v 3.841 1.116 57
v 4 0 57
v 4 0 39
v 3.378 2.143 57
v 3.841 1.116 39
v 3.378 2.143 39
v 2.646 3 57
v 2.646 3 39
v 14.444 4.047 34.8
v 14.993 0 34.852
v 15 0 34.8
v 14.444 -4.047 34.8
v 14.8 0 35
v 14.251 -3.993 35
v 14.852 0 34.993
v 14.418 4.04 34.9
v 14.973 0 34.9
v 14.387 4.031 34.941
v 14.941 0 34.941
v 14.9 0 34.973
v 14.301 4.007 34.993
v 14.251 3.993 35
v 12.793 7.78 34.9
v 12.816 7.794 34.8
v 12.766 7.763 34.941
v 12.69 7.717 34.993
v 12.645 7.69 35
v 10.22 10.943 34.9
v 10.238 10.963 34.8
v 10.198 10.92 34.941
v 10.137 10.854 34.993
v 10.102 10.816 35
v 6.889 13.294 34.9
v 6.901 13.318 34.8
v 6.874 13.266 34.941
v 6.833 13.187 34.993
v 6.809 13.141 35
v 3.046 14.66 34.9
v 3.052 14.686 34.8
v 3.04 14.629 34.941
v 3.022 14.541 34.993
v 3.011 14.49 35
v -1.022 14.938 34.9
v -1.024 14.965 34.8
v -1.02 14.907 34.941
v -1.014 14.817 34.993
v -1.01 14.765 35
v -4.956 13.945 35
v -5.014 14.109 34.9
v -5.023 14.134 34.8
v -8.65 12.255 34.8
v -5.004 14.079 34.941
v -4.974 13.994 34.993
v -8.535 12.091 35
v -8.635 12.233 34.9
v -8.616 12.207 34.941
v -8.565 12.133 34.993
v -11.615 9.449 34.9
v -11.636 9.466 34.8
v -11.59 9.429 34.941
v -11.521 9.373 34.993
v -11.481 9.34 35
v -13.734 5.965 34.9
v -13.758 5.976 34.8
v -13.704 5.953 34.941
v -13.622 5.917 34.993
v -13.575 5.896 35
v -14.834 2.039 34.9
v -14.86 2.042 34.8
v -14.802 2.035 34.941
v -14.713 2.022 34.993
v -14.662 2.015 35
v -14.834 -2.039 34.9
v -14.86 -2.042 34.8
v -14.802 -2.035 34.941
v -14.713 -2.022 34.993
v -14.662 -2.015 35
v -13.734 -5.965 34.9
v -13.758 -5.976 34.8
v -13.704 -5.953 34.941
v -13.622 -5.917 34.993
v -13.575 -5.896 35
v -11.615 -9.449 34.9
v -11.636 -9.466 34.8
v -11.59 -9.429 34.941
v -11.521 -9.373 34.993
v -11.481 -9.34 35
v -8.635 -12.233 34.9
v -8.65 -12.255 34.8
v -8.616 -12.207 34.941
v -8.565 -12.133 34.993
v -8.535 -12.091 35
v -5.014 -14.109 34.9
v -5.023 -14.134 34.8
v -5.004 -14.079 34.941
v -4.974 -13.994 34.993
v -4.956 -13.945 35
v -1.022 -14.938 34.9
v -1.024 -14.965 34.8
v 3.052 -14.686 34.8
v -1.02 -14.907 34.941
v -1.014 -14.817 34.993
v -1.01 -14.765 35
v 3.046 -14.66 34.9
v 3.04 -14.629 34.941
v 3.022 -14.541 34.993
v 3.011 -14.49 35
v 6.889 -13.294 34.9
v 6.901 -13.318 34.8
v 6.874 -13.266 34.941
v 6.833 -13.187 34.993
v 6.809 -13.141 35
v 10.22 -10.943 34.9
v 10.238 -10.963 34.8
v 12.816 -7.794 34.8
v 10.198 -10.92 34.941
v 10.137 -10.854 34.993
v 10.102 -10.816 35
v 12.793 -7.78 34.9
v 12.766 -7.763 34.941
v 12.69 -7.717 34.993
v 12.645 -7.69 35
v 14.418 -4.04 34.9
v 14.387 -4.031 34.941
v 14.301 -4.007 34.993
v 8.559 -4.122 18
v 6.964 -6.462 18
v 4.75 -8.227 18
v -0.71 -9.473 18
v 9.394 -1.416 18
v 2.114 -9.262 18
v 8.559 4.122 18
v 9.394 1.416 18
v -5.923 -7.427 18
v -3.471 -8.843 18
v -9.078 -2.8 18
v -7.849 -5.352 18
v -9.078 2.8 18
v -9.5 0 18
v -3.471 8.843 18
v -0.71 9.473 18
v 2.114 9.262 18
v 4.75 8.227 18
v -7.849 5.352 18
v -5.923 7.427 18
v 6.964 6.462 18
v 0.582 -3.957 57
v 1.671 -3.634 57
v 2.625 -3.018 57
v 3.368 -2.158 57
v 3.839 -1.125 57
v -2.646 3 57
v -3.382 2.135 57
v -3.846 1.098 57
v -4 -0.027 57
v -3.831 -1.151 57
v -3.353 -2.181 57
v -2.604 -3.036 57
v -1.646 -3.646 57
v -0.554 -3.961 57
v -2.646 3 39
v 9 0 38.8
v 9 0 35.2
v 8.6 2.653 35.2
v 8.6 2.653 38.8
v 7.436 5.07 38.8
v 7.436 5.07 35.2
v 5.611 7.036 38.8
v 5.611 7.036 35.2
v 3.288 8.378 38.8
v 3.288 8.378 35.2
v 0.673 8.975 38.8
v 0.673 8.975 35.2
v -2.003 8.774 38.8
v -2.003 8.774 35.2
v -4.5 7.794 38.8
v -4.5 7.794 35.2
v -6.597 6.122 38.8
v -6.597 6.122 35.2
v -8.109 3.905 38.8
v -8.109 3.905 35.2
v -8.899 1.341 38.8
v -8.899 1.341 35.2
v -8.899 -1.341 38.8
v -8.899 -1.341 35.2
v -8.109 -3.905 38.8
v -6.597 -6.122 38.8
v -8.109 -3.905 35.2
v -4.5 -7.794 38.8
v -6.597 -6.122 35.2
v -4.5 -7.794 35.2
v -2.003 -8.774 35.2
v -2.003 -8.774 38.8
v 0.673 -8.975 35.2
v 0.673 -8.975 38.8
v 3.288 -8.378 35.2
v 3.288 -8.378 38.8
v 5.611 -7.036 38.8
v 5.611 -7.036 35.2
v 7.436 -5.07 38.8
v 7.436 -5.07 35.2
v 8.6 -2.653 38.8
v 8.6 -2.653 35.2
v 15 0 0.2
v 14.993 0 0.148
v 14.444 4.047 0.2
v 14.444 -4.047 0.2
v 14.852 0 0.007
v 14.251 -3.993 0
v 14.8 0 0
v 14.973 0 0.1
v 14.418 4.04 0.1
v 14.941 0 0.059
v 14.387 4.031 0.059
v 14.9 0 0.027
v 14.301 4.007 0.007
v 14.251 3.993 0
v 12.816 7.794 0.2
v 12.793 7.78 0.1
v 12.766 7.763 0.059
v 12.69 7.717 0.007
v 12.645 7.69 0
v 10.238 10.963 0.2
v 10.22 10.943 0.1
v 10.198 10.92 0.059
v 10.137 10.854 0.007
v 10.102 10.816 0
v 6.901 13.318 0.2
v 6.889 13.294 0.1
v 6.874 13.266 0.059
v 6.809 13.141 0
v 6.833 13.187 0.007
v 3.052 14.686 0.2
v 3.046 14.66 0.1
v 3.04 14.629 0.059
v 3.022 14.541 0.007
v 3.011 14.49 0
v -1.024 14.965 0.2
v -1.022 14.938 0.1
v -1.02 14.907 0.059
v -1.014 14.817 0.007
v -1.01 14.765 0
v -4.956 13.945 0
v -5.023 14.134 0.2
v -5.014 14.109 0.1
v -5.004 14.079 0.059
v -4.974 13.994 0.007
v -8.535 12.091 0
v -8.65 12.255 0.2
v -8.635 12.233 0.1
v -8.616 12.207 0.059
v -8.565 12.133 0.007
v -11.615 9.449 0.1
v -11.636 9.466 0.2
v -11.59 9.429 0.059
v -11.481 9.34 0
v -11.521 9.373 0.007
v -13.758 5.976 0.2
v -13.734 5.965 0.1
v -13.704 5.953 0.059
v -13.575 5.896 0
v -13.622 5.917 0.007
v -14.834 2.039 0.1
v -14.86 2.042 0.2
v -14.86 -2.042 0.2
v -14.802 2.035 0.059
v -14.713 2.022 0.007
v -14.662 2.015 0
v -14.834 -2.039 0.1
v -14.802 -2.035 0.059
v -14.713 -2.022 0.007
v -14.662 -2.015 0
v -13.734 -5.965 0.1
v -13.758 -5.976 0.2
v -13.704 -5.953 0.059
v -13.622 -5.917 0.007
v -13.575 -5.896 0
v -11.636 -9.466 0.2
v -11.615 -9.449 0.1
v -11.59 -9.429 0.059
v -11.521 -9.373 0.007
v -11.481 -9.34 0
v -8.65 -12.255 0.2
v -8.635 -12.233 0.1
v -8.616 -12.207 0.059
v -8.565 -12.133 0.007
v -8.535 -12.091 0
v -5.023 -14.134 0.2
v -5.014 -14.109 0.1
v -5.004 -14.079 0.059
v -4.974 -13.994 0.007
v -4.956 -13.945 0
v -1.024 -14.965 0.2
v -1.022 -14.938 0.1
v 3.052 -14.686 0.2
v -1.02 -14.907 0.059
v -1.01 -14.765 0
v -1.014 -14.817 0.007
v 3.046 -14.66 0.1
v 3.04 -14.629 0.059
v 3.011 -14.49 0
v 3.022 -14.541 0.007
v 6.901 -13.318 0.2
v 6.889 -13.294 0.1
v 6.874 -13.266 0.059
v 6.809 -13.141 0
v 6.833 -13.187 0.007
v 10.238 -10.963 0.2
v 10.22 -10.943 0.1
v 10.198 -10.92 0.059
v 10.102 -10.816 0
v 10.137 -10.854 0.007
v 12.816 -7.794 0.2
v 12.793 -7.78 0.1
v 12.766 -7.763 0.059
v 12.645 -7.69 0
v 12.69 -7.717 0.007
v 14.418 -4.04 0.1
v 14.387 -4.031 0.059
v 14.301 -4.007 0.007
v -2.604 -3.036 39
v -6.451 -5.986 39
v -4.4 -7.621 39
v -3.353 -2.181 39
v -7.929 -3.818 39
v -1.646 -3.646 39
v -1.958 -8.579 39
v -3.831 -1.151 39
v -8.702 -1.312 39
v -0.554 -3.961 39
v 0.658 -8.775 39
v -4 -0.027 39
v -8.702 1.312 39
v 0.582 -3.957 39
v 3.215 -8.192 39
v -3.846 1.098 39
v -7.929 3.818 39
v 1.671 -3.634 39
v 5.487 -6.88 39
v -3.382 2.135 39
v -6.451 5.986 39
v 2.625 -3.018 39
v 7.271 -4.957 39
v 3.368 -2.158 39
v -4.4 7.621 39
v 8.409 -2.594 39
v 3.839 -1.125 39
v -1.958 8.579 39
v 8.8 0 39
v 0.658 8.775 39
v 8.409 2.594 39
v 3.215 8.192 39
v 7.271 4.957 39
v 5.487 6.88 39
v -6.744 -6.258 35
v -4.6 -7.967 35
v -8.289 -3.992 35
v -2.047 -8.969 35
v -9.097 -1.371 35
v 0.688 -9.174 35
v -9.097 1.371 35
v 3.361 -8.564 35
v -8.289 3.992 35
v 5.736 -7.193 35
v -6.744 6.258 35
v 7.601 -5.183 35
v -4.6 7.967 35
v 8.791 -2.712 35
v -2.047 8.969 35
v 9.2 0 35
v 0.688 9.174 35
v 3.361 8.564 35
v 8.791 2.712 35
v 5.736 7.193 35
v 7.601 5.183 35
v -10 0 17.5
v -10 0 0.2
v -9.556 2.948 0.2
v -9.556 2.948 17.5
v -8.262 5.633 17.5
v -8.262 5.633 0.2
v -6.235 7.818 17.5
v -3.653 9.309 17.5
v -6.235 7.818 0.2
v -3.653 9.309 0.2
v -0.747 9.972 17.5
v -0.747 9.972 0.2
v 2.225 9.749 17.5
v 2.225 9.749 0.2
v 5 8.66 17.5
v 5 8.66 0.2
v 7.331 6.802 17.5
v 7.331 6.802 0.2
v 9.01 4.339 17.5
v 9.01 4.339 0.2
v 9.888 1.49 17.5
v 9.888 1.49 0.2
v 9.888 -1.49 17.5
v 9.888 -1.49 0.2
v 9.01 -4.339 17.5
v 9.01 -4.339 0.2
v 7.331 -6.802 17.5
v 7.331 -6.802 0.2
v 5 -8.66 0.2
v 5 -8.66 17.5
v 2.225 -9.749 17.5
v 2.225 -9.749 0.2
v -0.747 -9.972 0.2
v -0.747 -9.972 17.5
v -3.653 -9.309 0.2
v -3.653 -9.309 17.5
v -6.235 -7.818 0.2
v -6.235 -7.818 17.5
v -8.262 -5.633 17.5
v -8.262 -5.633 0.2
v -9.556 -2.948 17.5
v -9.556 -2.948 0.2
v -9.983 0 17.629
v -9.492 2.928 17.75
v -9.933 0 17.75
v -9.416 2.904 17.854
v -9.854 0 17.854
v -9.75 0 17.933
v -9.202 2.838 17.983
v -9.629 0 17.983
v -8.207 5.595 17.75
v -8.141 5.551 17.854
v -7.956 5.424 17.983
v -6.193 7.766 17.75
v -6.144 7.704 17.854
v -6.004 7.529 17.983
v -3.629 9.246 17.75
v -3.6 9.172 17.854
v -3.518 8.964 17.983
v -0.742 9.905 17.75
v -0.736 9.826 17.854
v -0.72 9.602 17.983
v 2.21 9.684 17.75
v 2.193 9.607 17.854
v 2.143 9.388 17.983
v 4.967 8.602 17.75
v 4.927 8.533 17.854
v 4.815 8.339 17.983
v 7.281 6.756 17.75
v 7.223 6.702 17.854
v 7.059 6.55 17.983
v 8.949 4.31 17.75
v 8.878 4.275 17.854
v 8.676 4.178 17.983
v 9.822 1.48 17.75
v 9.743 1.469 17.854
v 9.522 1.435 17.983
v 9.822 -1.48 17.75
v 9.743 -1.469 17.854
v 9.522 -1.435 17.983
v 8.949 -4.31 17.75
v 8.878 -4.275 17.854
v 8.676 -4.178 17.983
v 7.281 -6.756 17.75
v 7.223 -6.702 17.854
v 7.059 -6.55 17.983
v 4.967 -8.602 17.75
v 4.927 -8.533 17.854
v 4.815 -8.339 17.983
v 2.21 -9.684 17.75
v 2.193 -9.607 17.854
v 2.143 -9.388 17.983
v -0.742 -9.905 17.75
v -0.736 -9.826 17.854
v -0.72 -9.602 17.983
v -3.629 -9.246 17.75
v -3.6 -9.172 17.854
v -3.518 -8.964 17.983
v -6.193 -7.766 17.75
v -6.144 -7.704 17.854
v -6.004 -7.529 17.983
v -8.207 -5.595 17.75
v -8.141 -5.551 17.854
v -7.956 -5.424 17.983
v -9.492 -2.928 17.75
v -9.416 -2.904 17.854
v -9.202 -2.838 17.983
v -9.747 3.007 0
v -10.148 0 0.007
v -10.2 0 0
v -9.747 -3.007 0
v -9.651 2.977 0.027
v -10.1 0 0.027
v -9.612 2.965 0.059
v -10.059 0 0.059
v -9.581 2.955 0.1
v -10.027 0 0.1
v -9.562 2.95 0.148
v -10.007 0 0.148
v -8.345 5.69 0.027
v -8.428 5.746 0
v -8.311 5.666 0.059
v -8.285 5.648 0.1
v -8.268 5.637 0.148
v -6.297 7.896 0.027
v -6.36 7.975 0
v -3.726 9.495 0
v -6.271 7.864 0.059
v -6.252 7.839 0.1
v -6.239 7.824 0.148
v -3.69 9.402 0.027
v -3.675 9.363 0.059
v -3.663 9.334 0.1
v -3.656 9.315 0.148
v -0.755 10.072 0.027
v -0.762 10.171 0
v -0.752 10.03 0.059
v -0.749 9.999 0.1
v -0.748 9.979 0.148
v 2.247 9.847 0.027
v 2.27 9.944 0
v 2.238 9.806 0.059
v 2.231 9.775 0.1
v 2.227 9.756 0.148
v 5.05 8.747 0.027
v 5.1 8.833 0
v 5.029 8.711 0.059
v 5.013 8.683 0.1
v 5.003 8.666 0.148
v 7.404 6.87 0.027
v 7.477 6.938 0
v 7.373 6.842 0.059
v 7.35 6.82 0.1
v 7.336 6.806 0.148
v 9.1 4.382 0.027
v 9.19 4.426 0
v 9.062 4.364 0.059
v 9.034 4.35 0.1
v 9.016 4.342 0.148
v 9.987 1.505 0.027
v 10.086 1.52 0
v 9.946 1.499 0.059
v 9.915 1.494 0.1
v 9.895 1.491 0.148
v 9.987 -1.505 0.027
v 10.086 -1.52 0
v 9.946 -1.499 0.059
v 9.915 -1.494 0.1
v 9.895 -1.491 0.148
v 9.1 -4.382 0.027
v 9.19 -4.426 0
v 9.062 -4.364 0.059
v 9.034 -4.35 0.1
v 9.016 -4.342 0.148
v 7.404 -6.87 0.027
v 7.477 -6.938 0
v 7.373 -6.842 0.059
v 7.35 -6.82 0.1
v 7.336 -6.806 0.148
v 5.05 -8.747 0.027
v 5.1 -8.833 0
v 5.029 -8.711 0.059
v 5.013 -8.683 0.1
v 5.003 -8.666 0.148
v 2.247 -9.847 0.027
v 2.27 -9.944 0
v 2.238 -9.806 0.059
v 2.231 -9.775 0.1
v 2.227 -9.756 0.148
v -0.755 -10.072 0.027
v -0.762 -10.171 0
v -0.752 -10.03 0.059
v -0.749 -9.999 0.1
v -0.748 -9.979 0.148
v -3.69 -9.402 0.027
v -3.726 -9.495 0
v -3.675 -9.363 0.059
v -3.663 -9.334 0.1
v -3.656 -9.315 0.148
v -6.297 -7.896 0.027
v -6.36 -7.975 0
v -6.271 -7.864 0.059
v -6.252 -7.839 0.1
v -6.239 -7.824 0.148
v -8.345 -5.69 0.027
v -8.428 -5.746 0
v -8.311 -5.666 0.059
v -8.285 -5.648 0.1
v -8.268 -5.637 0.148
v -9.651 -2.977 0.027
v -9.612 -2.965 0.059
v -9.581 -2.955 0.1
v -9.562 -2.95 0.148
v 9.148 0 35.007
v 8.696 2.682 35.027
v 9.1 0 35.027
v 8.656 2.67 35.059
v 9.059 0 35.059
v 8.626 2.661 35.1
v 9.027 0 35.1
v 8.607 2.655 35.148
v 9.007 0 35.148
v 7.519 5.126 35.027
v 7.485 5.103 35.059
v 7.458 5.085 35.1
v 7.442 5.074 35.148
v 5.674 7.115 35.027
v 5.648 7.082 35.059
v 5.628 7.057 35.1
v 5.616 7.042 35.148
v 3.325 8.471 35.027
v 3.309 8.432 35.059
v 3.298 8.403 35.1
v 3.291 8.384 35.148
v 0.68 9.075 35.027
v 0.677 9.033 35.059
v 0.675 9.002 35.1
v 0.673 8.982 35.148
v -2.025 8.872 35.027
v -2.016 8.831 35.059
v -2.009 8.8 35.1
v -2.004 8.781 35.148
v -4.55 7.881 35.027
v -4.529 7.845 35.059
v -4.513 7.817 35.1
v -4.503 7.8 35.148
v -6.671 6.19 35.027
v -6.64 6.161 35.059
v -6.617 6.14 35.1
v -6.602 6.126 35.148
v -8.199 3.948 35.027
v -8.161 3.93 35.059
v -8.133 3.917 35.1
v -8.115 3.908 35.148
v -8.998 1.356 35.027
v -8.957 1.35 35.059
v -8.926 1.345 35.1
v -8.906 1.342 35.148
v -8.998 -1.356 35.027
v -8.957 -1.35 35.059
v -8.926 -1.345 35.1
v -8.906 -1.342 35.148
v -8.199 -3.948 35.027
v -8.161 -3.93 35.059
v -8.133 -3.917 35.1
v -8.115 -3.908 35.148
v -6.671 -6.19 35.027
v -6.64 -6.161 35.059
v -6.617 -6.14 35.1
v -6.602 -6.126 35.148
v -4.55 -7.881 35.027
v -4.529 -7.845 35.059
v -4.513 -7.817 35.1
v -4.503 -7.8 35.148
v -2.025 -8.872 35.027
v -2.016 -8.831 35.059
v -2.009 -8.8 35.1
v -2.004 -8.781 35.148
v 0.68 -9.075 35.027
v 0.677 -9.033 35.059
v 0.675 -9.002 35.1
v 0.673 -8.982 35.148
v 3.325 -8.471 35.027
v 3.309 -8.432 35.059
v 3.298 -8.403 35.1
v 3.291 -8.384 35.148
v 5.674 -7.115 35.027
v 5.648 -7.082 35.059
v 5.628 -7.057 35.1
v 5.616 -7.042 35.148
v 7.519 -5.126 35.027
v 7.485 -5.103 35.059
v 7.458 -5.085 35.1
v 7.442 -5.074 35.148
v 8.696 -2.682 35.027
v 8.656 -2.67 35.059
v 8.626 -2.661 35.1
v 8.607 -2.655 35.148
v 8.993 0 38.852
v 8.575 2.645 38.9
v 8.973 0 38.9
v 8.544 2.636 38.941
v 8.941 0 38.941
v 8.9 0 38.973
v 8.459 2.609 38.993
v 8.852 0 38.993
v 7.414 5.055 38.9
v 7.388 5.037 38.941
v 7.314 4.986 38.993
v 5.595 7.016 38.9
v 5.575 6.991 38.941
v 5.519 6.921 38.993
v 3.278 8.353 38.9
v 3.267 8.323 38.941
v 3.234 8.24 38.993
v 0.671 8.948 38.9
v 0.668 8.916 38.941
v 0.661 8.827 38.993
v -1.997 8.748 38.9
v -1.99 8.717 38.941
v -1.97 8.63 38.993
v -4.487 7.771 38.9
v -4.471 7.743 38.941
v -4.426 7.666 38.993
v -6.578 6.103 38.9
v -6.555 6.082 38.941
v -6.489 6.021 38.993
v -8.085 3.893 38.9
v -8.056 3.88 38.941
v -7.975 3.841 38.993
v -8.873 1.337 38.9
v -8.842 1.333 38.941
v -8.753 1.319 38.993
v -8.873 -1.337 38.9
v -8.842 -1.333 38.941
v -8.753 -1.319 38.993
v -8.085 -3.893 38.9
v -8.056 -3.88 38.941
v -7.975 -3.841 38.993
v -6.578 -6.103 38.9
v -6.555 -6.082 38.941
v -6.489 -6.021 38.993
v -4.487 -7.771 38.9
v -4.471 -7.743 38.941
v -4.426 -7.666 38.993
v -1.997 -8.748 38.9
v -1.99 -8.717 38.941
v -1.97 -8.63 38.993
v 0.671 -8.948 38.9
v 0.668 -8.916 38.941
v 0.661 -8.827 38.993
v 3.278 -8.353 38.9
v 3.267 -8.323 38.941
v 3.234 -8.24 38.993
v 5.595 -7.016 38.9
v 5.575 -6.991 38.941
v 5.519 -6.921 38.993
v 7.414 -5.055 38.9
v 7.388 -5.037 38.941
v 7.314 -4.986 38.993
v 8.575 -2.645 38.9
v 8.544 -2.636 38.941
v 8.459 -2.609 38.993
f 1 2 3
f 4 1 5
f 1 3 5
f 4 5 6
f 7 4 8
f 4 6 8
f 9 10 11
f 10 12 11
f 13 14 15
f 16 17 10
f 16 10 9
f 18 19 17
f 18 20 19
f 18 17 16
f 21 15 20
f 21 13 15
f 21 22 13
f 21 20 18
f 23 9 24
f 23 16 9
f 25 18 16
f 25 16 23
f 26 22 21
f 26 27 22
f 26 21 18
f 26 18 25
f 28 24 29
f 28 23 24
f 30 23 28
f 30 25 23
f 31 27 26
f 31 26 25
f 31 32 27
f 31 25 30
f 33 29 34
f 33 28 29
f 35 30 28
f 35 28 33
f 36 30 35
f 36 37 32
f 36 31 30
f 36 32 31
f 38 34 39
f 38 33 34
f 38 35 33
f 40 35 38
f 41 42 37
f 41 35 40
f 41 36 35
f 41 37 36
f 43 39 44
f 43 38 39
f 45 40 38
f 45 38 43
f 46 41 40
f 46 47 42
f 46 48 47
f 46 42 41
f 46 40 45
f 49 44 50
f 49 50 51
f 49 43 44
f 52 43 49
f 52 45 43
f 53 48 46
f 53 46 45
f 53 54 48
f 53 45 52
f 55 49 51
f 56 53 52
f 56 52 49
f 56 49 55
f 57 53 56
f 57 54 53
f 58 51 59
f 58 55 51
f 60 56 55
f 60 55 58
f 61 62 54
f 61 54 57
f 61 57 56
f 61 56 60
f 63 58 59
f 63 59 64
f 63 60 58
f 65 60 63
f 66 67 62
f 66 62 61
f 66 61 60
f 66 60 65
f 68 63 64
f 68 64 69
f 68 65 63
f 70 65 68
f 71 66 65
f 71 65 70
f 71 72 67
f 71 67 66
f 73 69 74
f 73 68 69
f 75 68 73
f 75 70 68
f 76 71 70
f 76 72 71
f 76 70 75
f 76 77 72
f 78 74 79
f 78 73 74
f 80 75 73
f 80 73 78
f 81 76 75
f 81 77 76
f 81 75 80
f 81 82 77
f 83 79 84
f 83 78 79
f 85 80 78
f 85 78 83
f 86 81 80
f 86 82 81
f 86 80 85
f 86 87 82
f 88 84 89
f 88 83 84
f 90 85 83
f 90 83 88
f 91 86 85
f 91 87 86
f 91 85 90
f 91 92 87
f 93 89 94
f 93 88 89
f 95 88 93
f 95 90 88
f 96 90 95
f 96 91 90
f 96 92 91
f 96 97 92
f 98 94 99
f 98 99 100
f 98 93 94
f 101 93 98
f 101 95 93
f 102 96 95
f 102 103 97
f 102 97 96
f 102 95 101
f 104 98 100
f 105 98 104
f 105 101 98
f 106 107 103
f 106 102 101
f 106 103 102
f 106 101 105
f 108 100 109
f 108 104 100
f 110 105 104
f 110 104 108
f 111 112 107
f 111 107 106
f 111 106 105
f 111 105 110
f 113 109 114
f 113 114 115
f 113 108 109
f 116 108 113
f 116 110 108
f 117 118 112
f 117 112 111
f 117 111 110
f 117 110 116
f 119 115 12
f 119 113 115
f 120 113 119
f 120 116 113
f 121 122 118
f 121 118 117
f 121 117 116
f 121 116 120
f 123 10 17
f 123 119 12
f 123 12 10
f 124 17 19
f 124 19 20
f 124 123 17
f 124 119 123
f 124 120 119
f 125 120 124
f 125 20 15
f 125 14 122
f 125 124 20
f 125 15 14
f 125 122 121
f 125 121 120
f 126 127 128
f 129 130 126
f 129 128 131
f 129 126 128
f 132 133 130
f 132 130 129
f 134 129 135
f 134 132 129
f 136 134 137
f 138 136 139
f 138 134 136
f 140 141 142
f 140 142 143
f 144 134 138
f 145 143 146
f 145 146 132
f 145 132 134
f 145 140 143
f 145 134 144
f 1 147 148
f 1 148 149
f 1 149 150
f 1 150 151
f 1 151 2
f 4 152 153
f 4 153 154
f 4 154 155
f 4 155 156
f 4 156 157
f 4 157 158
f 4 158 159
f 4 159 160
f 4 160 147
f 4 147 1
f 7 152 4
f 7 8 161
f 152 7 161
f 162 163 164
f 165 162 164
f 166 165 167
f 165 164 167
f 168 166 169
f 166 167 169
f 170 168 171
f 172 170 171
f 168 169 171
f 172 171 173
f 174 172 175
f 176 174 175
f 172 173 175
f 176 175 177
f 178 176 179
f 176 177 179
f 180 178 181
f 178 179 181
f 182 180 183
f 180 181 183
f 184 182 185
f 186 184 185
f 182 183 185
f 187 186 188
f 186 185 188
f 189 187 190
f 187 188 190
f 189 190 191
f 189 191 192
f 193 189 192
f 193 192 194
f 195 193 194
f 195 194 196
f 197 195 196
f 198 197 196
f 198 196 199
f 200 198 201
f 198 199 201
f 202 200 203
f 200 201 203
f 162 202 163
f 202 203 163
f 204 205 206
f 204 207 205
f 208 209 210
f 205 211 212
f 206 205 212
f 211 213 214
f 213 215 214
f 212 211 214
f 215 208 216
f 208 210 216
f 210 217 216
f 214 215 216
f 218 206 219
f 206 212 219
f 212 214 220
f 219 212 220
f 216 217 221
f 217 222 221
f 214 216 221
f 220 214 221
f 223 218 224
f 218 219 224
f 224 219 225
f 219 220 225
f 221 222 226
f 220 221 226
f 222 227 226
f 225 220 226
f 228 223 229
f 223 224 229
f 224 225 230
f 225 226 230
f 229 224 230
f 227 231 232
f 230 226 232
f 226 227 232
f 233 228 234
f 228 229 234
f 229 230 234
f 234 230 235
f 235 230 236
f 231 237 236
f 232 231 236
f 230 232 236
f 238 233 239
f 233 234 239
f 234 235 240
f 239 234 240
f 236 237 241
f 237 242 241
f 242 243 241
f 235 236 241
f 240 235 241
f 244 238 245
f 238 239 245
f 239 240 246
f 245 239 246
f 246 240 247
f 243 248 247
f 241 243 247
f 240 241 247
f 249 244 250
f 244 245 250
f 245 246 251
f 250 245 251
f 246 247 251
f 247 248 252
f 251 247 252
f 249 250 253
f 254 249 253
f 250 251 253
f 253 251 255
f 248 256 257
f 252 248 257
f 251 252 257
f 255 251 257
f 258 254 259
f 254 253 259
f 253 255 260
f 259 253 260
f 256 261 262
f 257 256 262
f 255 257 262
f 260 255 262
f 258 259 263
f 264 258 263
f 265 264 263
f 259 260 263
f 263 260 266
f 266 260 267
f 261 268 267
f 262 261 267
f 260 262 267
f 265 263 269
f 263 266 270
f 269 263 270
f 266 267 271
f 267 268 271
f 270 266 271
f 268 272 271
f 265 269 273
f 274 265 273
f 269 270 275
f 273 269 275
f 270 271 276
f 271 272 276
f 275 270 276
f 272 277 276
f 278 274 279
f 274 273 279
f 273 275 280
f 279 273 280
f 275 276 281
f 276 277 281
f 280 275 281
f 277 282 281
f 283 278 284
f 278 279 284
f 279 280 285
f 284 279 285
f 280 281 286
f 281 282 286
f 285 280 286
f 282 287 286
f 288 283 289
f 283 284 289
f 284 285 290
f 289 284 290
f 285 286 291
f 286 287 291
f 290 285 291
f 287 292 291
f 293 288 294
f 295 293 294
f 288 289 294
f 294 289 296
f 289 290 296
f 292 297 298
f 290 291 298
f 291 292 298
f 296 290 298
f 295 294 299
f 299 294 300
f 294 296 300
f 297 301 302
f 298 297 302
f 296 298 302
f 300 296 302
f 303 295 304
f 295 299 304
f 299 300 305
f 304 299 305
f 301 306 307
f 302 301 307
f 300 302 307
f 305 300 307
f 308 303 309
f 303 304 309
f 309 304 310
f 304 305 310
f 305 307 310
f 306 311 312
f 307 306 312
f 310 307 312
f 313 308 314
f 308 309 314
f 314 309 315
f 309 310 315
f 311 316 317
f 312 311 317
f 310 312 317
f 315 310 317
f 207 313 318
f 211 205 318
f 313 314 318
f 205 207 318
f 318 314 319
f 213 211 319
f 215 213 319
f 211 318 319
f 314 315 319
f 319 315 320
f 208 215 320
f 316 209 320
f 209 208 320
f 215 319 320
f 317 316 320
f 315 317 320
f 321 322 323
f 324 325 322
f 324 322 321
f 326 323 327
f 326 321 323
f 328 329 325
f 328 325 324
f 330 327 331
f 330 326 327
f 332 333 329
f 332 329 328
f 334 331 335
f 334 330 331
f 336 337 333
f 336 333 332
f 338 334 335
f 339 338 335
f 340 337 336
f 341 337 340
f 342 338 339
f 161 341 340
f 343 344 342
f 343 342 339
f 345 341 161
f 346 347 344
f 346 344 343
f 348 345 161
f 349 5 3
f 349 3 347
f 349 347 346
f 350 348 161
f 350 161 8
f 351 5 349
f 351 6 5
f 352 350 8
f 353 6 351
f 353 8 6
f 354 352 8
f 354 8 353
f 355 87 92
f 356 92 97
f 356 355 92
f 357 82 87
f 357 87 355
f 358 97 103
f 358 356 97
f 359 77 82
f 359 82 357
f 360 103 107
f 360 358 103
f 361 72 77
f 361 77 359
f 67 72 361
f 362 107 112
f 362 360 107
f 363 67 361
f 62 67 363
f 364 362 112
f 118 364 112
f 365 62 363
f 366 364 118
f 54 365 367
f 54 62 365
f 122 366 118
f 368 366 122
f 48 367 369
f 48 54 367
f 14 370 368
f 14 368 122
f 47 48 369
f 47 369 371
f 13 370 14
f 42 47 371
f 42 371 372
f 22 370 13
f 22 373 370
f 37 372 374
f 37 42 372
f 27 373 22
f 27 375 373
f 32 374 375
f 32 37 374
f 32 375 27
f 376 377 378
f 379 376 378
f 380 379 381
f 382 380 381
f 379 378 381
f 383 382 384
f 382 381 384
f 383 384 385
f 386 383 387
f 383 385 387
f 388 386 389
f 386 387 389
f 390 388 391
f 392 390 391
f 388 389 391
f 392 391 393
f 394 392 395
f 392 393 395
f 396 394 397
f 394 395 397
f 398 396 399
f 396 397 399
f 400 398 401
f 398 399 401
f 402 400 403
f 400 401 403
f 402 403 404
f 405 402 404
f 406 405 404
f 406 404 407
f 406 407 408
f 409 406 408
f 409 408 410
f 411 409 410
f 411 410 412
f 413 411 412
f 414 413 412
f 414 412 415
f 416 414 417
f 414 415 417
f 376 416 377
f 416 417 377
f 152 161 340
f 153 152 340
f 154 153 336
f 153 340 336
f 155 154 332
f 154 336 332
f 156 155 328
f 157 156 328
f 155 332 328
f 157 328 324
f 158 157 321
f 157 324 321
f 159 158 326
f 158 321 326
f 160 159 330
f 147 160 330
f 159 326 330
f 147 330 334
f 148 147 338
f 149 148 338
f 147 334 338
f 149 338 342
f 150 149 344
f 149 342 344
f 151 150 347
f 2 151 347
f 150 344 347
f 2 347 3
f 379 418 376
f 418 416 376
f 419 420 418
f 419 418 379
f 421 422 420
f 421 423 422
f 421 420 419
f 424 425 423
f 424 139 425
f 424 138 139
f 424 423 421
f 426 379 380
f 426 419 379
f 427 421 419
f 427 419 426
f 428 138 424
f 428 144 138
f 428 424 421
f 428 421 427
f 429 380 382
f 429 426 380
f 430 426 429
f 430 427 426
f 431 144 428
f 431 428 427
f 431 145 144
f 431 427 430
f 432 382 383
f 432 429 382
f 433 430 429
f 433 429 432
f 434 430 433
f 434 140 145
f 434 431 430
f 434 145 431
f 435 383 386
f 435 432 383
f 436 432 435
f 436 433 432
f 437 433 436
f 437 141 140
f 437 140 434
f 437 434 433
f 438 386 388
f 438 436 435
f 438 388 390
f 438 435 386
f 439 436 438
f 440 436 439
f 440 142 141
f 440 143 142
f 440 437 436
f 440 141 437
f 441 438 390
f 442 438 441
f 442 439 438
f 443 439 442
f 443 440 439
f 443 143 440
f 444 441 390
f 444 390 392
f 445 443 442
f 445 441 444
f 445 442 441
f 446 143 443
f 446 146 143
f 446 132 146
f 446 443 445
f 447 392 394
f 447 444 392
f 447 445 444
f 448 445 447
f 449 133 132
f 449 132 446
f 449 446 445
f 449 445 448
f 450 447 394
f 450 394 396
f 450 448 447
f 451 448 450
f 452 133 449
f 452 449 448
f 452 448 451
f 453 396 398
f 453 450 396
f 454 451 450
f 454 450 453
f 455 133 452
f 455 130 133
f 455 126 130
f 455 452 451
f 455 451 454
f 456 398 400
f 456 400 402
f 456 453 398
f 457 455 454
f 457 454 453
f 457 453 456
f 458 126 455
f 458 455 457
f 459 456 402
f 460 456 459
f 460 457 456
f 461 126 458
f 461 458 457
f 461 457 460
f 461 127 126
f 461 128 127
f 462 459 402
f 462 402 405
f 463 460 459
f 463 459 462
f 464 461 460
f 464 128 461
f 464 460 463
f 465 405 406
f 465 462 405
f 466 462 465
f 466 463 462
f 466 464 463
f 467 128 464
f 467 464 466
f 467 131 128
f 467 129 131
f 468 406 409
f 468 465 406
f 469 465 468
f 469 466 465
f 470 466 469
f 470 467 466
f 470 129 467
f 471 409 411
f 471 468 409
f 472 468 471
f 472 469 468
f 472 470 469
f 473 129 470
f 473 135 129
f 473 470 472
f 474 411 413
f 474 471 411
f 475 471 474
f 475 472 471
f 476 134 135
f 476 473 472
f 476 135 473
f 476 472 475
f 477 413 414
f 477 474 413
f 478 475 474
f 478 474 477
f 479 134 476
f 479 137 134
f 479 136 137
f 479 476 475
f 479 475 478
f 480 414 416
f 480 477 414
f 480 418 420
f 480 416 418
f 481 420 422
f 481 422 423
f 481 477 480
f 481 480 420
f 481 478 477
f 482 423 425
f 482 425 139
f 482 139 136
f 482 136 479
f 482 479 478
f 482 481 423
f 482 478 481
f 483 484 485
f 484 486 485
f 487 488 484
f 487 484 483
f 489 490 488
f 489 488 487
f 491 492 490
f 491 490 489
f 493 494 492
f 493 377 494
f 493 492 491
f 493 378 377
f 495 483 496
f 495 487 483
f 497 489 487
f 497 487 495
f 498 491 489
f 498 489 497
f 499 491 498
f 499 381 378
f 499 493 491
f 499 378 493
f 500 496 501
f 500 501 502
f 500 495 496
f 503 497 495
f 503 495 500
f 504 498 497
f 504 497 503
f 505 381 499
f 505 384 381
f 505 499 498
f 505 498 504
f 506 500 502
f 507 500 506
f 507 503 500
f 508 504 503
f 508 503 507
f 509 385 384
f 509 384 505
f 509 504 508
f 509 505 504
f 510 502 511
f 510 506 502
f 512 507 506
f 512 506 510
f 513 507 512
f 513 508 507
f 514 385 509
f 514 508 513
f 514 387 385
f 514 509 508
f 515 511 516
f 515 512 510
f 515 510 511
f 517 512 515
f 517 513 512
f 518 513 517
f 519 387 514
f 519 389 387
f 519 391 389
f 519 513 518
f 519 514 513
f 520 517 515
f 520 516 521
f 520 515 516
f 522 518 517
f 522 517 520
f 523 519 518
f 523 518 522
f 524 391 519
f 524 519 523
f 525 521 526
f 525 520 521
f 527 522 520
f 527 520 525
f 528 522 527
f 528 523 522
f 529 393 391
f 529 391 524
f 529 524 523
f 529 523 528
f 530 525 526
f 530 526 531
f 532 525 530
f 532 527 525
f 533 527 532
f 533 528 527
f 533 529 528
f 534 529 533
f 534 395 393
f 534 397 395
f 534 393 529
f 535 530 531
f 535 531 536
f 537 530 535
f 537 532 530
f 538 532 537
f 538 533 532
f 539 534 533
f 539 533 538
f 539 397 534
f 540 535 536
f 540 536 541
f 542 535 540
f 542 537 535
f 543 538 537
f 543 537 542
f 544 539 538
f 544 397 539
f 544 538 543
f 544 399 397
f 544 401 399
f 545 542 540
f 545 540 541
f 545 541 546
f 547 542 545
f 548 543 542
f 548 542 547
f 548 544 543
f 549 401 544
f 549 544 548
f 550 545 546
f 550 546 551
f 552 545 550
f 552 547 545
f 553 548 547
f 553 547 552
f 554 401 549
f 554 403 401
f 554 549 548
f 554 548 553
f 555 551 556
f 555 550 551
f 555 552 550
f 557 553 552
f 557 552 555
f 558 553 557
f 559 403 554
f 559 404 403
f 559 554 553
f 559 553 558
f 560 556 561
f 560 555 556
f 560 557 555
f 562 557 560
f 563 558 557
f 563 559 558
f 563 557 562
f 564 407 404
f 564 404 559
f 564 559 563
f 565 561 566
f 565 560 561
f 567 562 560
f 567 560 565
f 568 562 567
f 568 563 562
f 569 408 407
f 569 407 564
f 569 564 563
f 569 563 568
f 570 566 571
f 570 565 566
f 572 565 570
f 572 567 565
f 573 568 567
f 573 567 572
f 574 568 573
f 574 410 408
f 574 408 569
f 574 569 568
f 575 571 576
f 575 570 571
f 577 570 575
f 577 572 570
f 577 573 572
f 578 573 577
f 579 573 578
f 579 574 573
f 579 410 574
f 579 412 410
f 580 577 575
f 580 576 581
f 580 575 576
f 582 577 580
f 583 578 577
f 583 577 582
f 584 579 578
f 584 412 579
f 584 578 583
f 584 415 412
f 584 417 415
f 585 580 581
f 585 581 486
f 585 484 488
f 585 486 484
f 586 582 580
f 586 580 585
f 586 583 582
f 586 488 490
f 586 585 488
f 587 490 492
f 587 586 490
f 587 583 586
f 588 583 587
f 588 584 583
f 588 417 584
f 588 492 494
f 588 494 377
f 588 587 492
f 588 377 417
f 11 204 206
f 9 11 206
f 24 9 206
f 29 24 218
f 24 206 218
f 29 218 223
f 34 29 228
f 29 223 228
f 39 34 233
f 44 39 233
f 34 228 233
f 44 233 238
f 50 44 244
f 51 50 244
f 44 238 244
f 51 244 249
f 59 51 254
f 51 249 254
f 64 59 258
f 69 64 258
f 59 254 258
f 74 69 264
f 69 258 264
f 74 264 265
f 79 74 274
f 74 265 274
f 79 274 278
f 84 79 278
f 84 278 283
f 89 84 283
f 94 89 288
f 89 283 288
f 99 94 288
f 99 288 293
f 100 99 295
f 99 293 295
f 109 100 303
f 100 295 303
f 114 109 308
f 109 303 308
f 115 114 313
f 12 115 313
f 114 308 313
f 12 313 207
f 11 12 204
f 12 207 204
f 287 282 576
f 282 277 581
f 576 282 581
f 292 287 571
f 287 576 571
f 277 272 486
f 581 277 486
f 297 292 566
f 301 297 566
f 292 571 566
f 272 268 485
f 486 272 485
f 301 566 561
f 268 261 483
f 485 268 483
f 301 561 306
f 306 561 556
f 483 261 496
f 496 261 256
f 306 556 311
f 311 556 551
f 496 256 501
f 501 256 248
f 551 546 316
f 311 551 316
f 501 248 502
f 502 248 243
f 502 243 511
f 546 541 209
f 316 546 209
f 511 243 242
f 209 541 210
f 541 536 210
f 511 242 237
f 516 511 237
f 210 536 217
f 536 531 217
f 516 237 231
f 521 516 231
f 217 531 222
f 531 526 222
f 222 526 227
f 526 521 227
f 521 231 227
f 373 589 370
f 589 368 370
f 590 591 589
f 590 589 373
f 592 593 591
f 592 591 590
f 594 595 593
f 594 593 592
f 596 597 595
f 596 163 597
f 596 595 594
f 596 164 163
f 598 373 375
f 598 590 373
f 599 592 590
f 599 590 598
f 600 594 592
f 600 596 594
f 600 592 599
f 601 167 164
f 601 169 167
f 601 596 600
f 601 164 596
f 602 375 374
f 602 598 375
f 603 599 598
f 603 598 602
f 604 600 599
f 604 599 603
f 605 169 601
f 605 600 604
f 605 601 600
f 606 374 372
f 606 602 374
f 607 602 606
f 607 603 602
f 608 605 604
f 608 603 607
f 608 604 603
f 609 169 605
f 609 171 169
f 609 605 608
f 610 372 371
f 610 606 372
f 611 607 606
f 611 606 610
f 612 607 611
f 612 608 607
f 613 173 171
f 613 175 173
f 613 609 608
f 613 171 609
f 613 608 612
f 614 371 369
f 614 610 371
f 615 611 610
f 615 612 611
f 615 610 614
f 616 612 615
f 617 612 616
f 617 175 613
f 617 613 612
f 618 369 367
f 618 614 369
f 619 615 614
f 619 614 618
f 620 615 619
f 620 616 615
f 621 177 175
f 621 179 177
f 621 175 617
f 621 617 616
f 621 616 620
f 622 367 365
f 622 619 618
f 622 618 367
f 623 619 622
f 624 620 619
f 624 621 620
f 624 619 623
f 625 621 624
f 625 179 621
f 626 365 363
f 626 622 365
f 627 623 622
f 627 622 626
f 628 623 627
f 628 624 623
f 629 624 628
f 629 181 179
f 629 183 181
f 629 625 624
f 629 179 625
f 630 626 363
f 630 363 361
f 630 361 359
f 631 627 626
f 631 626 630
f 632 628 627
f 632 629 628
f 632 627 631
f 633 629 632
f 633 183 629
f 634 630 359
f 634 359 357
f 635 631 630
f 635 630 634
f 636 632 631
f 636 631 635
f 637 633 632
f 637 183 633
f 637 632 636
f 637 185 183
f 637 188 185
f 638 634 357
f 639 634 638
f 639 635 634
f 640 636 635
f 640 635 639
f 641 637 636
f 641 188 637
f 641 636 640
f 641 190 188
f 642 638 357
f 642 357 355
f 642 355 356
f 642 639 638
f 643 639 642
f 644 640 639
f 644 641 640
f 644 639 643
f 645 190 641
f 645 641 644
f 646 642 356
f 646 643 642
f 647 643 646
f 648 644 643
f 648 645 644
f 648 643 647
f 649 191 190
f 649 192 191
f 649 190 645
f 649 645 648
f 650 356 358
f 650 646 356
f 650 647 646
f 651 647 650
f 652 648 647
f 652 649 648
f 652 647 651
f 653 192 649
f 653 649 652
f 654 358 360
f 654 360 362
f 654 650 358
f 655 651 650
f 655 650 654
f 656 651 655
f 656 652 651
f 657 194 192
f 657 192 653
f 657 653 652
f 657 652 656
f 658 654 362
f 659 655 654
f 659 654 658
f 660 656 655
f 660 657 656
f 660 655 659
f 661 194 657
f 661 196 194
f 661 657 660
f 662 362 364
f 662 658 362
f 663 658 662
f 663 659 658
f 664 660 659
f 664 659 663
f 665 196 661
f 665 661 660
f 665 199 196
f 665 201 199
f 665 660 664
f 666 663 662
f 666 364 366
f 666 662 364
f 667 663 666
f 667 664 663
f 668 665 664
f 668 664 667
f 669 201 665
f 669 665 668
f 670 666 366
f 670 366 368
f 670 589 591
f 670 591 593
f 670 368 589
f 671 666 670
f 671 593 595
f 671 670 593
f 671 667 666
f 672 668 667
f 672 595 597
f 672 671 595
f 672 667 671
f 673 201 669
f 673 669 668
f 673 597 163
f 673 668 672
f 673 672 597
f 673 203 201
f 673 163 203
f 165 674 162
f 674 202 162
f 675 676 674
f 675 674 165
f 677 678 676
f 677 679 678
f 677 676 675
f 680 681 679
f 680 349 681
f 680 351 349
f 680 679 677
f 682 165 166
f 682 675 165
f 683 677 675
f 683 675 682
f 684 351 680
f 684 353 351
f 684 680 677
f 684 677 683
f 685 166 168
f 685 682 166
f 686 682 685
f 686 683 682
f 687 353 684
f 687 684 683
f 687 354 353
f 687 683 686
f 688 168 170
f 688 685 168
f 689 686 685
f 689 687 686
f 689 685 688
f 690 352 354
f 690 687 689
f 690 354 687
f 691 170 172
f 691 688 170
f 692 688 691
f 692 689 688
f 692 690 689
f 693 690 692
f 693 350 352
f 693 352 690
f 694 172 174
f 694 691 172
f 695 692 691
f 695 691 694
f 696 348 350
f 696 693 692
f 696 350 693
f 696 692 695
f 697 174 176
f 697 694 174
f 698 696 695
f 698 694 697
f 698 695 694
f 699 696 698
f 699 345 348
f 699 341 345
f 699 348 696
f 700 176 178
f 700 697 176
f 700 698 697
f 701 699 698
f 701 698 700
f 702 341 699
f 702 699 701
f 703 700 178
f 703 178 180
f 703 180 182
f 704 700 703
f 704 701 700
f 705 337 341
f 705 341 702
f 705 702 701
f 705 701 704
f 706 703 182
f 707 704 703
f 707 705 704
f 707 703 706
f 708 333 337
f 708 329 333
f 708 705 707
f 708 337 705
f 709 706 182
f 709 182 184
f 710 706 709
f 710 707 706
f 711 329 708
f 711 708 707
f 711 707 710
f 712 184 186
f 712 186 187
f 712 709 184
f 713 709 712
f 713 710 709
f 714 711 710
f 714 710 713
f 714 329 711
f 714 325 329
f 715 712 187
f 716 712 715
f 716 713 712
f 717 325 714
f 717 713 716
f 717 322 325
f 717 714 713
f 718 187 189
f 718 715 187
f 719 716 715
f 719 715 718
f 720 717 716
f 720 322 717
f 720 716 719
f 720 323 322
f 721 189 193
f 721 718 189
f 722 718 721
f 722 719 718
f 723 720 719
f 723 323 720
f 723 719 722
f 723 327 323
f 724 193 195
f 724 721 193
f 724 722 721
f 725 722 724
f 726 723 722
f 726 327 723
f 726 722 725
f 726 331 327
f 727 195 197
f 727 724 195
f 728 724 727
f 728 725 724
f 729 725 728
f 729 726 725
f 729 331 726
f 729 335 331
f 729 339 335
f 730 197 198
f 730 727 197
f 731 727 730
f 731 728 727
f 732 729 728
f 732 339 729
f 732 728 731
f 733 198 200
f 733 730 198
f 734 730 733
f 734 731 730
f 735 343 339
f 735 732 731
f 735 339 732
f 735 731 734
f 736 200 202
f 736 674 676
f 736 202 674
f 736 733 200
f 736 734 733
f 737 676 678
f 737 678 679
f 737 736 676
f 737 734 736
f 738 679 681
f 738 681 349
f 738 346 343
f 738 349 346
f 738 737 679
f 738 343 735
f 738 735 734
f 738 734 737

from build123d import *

# Parameters (mm, degrees)
ESQUISSE1_R             = 15
BOSS_EXTRU_1_DEPTH      = 35
ESQUISSE2_R             = 9
BOSS_EXTRU_2_DEPTH      = 4
BOSS_EXTRU_3_DEPTH      = 18
ESQUISSE4_R             = 10
ENL_V_MAT_EXTRU_1_DEPTH = 18
CONG_1_R                = 0.2
CONG_2_R                = 0.5


with BuildPart() as part:
    # Esquisse1 → Boss.-Extru.1 (new body)
    with BuildSketch(Plane.XY):
        Circle(ESQUISSE1_R)
    extrude(amount=BOSS_EXTRU_1_DEPTH)

    # Esquisse2 → Boss.-Extru.2 (add)
    with BuildSketch(Plane.XY.offset(35)):
        Circle(ESQUISSE2_R)
    extrude(amount=BOSS_EXTRU_2_DEPTH)

    # Esquisse3 → Boss.-Extru.3 (add)
    with BuildSketch(Plane.XY.offset(39)):
        with BuildLine():
            Line((2.645751311, 3), (-2.645751311, 3))
            ThreePointArc((-2.645751311, 3), (-1.645751311, -3.645751311), (4, 0))
            ThreePointArc((4, 0), (3.645751311, 1.645751311), (2.645751311, 3))
        make_face()
    extrude(amount=BOSS_EXTRU_3_DEPTH)

    # Esquisse4 → Enlèv. mat.-Extru.1 (cut)
    with BuildSketch(Plane(origin=(0, 0, 0), x_dir=(-1, 0, 0), z_dir=(0, 0, -1))):
        Circle(ESQUISSE4_R)
    extrude(amount=-ENL_V_MAT_EXTRU_1_DEPTH, mode=Mode.SUBTRACT)

    # Congé1
    cong_1_edges = [part.edges().sort_by_distance(p)[0] for p in [
        (-15, 0, 0),
        (10, 0, 0),
        (-15, 0, 35),
        (-9, 0, 35),
        (-9, 0, 39),
    ]]
    fillet(cong_1_edges, radius=CONG_1_R)

    # Congé2
    cong_2_edges = [part.edges().sort_by_distance(p)[0] for p in [
        (10, 0, 18),
    ]]
    fillet(cong_2_edges, radius=CONG_2_R)


solid = part.part
